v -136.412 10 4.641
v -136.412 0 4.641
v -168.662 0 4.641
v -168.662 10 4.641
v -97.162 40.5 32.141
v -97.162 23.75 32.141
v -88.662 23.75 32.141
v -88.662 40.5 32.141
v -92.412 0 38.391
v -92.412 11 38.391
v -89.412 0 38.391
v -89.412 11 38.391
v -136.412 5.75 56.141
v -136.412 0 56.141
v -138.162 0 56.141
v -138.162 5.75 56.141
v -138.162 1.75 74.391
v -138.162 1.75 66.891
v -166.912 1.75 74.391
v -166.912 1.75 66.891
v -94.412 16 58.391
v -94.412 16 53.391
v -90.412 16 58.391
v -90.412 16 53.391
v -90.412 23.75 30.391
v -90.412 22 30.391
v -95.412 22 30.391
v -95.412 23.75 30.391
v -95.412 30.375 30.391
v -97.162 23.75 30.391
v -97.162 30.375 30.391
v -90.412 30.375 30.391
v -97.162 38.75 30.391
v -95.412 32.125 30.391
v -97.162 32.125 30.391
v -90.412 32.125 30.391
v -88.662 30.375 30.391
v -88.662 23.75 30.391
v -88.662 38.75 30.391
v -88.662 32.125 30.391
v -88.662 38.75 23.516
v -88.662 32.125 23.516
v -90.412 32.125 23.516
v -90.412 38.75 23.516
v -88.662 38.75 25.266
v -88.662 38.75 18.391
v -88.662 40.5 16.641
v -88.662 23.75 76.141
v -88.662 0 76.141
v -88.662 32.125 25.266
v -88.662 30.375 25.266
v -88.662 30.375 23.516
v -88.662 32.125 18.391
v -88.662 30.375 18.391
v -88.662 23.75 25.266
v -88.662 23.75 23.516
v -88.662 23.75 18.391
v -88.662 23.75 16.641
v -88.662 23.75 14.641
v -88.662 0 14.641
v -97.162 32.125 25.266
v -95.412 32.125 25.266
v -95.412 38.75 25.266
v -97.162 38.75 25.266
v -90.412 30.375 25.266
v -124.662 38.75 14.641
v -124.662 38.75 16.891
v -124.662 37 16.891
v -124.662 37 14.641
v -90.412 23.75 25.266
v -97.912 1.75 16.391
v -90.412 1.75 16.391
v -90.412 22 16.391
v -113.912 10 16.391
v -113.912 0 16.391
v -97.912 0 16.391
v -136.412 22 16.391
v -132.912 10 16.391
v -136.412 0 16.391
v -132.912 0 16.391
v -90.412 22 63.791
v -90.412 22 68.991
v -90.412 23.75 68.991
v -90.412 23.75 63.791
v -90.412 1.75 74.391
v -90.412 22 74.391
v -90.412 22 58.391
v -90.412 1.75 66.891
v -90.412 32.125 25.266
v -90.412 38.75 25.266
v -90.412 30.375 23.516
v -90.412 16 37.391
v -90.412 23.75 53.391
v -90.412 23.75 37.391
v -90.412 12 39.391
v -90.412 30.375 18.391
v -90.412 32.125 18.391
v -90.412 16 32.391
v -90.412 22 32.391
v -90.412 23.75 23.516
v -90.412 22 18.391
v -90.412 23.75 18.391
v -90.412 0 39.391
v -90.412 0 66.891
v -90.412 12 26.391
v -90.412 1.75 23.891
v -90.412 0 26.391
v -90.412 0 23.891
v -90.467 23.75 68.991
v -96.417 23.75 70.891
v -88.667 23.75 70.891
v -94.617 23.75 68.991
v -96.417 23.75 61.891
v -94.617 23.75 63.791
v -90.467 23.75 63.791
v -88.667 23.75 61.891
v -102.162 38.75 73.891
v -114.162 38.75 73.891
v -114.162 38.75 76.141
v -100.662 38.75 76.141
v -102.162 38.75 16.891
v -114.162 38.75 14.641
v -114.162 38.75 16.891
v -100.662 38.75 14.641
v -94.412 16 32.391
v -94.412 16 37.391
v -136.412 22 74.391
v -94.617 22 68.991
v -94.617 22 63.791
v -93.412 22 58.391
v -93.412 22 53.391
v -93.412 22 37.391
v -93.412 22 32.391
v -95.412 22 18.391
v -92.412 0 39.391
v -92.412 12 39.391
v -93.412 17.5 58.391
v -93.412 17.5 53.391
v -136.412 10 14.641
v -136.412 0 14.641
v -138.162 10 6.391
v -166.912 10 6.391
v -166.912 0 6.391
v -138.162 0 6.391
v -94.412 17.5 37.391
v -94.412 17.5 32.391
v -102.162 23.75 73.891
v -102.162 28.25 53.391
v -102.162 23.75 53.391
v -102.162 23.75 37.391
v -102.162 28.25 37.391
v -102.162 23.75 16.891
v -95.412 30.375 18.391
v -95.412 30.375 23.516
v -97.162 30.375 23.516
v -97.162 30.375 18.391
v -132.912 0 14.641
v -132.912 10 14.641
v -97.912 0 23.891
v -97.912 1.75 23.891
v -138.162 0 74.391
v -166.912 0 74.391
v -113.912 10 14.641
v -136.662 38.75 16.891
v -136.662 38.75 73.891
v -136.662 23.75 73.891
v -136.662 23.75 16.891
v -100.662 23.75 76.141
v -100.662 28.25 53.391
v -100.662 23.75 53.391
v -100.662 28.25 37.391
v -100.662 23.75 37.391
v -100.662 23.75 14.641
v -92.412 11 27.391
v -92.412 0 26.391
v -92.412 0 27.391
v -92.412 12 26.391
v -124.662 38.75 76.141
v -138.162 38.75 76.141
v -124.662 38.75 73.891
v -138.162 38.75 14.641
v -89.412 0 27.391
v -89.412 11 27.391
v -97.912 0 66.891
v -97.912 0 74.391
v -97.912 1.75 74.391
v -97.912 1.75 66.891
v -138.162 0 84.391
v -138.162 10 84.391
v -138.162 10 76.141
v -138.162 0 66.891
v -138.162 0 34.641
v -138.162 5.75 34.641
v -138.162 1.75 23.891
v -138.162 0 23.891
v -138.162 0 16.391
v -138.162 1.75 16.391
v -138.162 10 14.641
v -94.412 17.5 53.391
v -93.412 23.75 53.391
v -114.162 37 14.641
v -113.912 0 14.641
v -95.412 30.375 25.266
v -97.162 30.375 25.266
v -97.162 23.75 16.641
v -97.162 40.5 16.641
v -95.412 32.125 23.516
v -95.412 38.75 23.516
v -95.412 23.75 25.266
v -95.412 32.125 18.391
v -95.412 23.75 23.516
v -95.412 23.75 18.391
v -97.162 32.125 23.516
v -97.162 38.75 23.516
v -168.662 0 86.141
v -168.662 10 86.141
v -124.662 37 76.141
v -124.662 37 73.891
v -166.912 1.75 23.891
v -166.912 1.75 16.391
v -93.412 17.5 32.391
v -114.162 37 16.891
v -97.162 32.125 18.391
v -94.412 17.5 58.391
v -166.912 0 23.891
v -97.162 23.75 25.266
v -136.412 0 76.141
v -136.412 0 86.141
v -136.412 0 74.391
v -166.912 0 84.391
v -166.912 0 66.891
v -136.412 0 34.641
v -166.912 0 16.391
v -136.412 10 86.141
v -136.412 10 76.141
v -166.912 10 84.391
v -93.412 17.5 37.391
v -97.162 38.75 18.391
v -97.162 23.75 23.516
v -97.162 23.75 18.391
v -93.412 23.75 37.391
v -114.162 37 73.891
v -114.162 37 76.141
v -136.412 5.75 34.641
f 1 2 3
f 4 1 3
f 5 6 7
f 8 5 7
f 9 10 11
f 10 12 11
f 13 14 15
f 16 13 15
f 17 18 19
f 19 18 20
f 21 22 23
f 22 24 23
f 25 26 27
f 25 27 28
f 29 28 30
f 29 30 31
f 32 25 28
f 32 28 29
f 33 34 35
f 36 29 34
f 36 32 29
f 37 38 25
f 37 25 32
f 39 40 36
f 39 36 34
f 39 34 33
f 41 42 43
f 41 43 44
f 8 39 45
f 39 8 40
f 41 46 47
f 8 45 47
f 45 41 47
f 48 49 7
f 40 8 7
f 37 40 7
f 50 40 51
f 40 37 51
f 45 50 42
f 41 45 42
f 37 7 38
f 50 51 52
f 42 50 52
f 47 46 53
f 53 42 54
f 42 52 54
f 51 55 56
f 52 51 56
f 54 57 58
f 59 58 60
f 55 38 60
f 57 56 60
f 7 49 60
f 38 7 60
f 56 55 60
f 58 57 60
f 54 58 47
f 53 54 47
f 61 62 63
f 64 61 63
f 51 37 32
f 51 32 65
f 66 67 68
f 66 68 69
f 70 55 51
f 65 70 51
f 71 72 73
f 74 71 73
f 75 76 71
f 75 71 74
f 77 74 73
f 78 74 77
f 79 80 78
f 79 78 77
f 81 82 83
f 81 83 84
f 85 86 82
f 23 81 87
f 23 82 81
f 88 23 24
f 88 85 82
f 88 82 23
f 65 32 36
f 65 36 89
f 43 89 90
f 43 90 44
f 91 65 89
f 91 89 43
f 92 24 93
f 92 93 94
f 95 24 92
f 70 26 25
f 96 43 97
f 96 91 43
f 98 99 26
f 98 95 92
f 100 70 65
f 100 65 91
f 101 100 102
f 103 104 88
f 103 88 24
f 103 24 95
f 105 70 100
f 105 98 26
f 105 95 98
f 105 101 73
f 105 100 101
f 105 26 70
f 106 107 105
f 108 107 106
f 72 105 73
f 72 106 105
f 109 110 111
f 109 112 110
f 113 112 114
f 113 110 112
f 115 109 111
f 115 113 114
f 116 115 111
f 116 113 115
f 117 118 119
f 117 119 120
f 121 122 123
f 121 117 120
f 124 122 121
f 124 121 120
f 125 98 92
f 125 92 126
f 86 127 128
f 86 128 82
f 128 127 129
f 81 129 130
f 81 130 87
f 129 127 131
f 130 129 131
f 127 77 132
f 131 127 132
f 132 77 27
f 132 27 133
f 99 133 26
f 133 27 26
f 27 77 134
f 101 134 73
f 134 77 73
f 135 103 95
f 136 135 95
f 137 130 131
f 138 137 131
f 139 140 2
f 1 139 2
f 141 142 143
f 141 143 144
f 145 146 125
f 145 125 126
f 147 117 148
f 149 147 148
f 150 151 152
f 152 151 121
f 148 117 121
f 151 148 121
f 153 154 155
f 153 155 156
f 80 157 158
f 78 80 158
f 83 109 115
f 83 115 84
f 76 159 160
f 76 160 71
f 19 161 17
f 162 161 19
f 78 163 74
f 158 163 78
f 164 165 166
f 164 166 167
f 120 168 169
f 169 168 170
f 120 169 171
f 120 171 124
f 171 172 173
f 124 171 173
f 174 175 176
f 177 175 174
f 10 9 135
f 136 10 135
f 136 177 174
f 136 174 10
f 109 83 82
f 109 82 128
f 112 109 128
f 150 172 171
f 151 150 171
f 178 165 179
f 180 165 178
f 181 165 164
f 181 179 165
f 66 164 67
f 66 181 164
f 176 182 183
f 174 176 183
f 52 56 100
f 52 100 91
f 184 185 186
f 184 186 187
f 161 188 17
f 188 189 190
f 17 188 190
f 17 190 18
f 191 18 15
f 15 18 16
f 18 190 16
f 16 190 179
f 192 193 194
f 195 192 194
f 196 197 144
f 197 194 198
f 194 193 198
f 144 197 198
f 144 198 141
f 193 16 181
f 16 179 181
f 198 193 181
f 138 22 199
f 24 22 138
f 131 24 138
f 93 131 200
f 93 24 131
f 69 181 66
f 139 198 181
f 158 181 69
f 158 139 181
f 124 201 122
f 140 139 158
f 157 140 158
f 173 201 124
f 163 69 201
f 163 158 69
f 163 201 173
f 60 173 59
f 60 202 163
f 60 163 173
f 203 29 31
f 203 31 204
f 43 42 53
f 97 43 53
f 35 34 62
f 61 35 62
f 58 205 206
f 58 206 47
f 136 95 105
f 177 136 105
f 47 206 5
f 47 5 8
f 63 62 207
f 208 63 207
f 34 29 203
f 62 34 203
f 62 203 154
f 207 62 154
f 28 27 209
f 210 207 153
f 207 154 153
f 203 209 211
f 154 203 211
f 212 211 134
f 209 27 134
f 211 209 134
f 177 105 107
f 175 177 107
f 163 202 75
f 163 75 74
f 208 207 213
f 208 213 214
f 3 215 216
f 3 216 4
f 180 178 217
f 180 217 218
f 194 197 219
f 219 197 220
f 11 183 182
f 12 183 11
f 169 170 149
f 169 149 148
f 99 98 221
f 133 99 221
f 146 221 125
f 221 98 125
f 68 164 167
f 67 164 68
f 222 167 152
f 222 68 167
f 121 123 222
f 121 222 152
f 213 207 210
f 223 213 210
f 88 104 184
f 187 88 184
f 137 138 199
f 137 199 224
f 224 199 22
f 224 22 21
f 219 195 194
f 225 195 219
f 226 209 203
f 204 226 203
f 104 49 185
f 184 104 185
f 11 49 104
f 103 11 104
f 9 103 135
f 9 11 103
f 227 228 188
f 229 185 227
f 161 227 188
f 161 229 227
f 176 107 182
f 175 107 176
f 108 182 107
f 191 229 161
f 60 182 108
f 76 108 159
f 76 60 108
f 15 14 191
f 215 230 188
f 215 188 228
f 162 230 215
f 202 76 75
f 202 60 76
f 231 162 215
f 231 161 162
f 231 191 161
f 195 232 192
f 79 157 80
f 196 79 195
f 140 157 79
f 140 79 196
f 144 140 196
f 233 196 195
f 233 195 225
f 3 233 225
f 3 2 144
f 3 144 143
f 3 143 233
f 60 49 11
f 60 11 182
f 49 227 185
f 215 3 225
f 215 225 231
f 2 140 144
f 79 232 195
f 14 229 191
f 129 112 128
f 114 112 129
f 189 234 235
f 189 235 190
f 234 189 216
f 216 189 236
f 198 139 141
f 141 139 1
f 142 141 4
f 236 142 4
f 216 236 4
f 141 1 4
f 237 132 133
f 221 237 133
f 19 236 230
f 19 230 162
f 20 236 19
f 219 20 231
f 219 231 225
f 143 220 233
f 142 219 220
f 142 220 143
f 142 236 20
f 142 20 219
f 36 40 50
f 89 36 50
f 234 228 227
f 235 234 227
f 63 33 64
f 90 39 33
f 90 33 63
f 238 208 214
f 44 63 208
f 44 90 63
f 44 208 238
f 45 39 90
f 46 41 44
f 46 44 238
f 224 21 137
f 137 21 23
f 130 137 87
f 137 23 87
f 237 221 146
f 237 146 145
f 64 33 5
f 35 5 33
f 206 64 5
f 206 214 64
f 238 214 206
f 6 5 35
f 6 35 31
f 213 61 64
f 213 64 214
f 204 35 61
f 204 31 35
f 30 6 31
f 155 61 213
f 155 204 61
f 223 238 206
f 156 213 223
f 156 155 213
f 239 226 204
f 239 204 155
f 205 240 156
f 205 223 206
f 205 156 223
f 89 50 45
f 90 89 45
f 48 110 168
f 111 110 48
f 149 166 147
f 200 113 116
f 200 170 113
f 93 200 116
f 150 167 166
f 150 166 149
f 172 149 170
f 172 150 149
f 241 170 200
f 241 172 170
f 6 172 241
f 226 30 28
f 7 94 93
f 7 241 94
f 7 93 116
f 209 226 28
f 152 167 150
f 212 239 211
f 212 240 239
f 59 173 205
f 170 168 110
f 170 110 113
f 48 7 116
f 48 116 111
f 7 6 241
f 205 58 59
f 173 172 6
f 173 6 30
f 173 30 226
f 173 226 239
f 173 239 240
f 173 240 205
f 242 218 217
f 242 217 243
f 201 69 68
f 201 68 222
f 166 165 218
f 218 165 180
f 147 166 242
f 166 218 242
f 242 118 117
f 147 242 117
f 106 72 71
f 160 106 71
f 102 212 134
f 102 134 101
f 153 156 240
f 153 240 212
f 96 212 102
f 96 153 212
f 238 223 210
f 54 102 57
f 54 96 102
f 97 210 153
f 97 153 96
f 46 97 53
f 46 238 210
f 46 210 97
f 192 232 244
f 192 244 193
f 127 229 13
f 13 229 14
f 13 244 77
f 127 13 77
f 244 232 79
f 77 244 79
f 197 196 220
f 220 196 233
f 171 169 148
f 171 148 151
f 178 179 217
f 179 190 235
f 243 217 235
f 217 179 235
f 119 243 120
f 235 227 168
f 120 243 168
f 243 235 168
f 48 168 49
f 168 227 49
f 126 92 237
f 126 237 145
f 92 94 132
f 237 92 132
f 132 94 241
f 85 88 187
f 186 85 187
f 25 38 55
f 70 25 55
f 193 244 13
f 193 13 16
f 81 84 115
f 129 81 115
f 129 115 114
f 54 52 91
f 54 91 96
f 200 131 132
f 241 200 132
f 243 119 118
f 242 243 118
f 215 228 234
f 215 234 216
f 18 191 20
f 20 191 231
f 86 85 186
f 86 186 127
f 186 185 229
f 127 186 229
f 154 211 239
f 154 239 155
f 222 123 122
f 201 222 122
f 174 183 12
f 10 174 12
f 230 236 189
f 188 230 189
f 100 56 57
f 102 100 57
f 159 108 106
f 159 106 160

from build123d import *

# Parameters (mm, degrees)
SKETCH1_W               = 49.5
SKETCH1_H               = 61.5
BOSS_EXTRUDE1_DEPTH     = 23.75
SKETCH2_W               = 46
SKETCH2_H               = 58
CUT_EXTRUDE1_DEPTH      = 22
SKETCH3_W               = 3
SKETCH3_H               = 16
CUT_EXTRUDE2_DEPTH      = 1.75
SKETCH7_W               = 3
SKETCH7_H               = 5
BOSS_EXTRUDE2_DEPTH     = 6
SKETCH11_W              = 37.5
SKETCH11_H              = 61.5
BOSS_EXTRUDE3_DEPTH     = 15
SKETCH12_W              = 34.5
SKETCH12_H              = 57
CUT_EXTRUDE3_DEPTH      = 15
SKETCH14_W              = 7.75
SKETCH14_H              = 9
BOSS_EXTRUDE4_DEPTH     = 0.0001
SKETCH15_W              = 4.15
SKETCH15_H              = 5.2
CUT_EXTRUDE4_DEPTH      = 4.75
SKETCH16_W              = 8.5
SKETCH16_H              = 15.5
BOSS_EXTRUDE5_DEPTH     = 16.75
SKETCH17_W              = 5.125
SKETCH17_H              = 6.625
CUT_EXTRUDE5_DEPTH      = 8.5
CUT_EXTRUDE6_DEPTH      = 15
CUT_EXTRUDE6_DEPTH_BACK = 1.75
SKETCH18_W              = 5
SKETCH18_H              = 12
SKETCH20_W              = 16
SKETCH20_H              = 4.5
CUT_EXTRUDE7_DEPTH      = 1.75
SKETCH21_W              = 32.25
SKETCH21_H              = 81.5
BOSS_EXTRUDE7_DEPTH     = 10
SKETCH23_W              = 28.75
SKETCH23_H              = 78
CUT_EXTRUDE8_DEPTH      = 10
SKETCH25_W              = 3
SKETCH25_H              = 5.4
BOSS_EXTRUDE8_DEPTH     = 1.75
SKETCH28_W              = 3
SKETCH28_H              = 2
BOSS_EXTRUDE9_DEPTH     = 1.75
SKETCH30_W              = 5
SKETCH30_H              = 1.5
BOSS_EXTRUDE11_DEPTH    = 1
SKETCH32_W              = 10.5
SKETCH32_H              = 2.25
CUT_EXTRUDE9_DEPTH      = 1.75
SKETCH33_W              = 11
SKETCH33_H              = 11
CUT_EXTRUDE10_DEPTH     = 1
SKETCH34_W              = 11
SKETCH34_H              = 1
BOSS_EXTRUDE12_DEPTH    = 2
SKETCH35_W              = 19
SKETCH35_H              = 10
CUT_EXTRUDE11_DEPTH     = 1.75
SKETCH36_W              = 1.75
SKETCH36_H              = 21.5
CUT_EXTRUDE12_DEPTH     = 5.75
SKETCH37_W              = 7.5
SKETCH37_H              = 7.5
SKETCH37_W_2            = 28.75
BOSS_EXTRUDE13_DEPTH    = 1.75


with BuildPart() as part:
    # Sketch1 → Boss-Extrude1 (new body)
    with BuildSketch(Plane(origin=(0, 0, 0), x_dir=(1, 0, 0), z_dir=(0, 1, 0))):
        with Locations((-113.412024913, -45.391200727)):
            Rectangle(SKETCH1_W, SKETCH1_H)
    extrude(amount=BOSS_EXTRUDE1_DEPTH)

    # Sketch2 → Cut-Extrude1 (cut)
    with BuildSketch(Plane(origin=(0, 0, 0), x_dir=(-1, 0, 0), z_dir=(0, -1, 0))):
        with Locations((113.412024913, -45.391200727)):
            Rectangle(SKETCH2_W, SKETCH2_H)
    extrude(amount=-CUT_EXTRUDE1_DEPTH, mode=Mode.SUBTRACT)

    # Sketch3 → Cut-Extrude2 (cut)
    with BuildSketch(Plane(origin=(0, 22, 0), x_dir=(-1, 0, 0), z_dir=(0, -1, 0))):
        with Locations((91.912024913, -66.391200727)):
            Rectangle(SKETCH3_W, SKETCH3_H)
        with Locations((91.912024913, -24.391200727)):
            Rectangle(SKETCH3_W, SKETCH3_H)
        with Locations((91.912024913, -45.391200727)):
            Rectangle(SKETCH3_W, SKETCH3_H)
    extrude(amount=-CUT_EXTRUDE2_DEPTH, mode=Mode.SUBTRACT)

    # Sketch7 → Boss-Extrude2 (add)
    with BuildSketch(Plane(origin=(0, 22, 0), x_dir=(-1, 0, 0), z_dir=(0, -1, 0))):
        with Locations((91.912024913, -55.891200727)):
            Rectangle(SKETCH7_W, SKETCH7_H)
        with Locations((91.912024913, -34.891200727)):
            Rectangle(SKETCH7_W, SKETCH7_H)
    extrude(amount=BOSS_EXTRUDE2_DEPTH)

    # Sketch11 → Boss-Extrude3 (add)
    with BuildSketch(Plane(origin=(0, 23.75, 0), x_dir=(1, 0, 0), z_dir=(0, 1, 0))):
        with Locations((-119.412024913, -45.391200727)):
            Rectangle(SKETCH11_W, SKETCH11_H)
    extrude(amount=BOSS_EXTRUDE3_DEPTH)

    # Sketch12 → Cut-Extrude3 (cut)
    with BuildSketch(Plane(origin=(0, 38.75, 0), x_dir=(1, 0, 0), z_dir=(0, 1, 0))):
        with Locations((-119.412024913, -45.391200727)):
            Rectangle(SKETCH12_W, SKETCH12_H)
    extrude(amount=-CUT_EXTRUDE3_DEPTH, mode=Mode.SUBTRACT)

    # Sketch14 → Boss-Extrude4 (add)
    with BuildSketch(Plane(origin=(0, 23.75, 0), x_dir=(1, 0, 0), z_dir=(0, 1, 0))):
        with Locations((-92.542024913, -66.391200727)):
            Rectangle(SKETCH14_W, SKETCH14_H)
    extrude(amount=BOSS_EXTRUDE4_DEPTH)

    # Sketch15 → Cut-Extrude4 (cut)
    with BuildSketch(Plane(origin=(0, 23.7501, 0), x_dir=(1, 0, 0), z_dir=(0, 1, 0))):
        with Locations((-92.542024913, -66.391200727)):
            Rectangle(SKETCH15_W, SKETCH15_H)
    extrude(amount=-CUT_EXTRUDE4_DEPTH, mode=Mode.SUBTRACT)

    # Sketch16 → Boss-Extrude5 (add)
    with BuildSketch(Plane(origin=(0, 23.75, 0), x_dir=(1, 0, 0), z_dir=(0, 1, 0))):
        with Locations((-92.912024913, -24.391200727)):
            Rectangle(SKETCH16_W, SKETCH16_H)
    extrude(amount=BOSS_EXTRUDE5_DEPTH)

    # Sketch17 → Cut-Extrude5 (cut)
    with BuildSketch(Plane(origin=(-88.662024913, 0, 0), x_dir=(0, 0, -1), z_dir=(1, 0, 0))):
        with Locations((-27.828700727, 35.4375)):
            Rectangle(SKETCH17_W, SKETCH17_H)
        with Locations((-27.828700727, 27.0625)):
            Rectangle(SKETCH17_W, SKETCH17_H)
        with Locations((-20.953700727, 35.4375)):
            Rectangle(SKETCH17_W, SKETCH17_H)
        with Locations((-20.953700727, 27.0625)):
            Rectangle(SKETCH17_W, SKETCH17_H)
    extrude(amount=-CUT_EXTRUDE5_DEPTH, mode=Mode.SUBTRACT)

    # Sketch18 → Cut-Extrude6 (cut, two sides: drawn at the far end of the back side and taken through both)
    with BuildSketch(Plane(origin=(0, 23.75, 0), x_dir=(1, 0, 0), z_dir=(0, 1, 0)).offset(-CUT_EXTRUDE6_DEPTH_BACK)):
        with Locations((-92.912024913, -24.391200727)):
            Rectangle(SKETCH18_W, SKETCH18_H)
    extrude(amount=CUT_EXTRUDE6_DEPTH + CUT_EXTRUDE6_DEPTH_BACK, mode=Mode.SUBTRACT)

    # Sketch20 → Cut-Extrude7 (cut)
    with BuildSketch(Plane(origin=(-100.662024913, 0, 0), x_dir=(0, 0, -1), z_dir=(1, 0, 0))):
        with Locations((-45.391200727, 26)):
            Rectangle(SKETCH20_W, SKETCH20_H)
    extrude(amount=-CUT_EXTRUDE7_DEPTH, mode=Mode.SUBTRACT)

    # Sketch21 → Boss-Extrude7 (add)
    with BuildSketch(Plane(origin=(0, 0, 0), x_dir=(-1, 0, 0), z_dir=(0, -1, 0))):
        with Locations((152.537024913, -45.391200727)):
            Rectangle(SKETCH21_W, SKETCH21_H)
    extrude(amount=-BOSS_EXTRUDE7_DEPTH)

    # Sketch23 → Cut-Extrude8 (cut)
    with BuildSketch(Plane(origin=(0, 10, 0), x_dir=(1, 0, 0), z_dir=(0, 1, 0))):
        with Locations((-152.537024913, -45.391200727)):
            Rectangle(SKETCH23_W, SKETCH23_H)
    extrude(amount=-CUT_EXTRUDE8_DEPTH, mode=Mode.SUBTRACT)

    # Sketch25 → Boss-Extrude8 (add)
    with BuildSketch(Plane(origin=(0, 22, 0), x_dir=(-1, 0, 0), z_dir=(0, -1, 0))):
        with Locations((91.912024913, -61.091200727)):
            Rectangle(SKETCH25_W, SKETCH25_H)
        with Locations((91.912024913, -71.691200727)):
            Rectangle(SKETCH25_W, SKETCH25_H)
    extrude(amount=-BOSS_EXTRUDE8_DEPTH)

    # Sketch28 → Boss-Extrude9 (add)
    with BuildSketch(Plane(origin=(0, 23.75, 0), x_dir=(1, 0, 0), z_dir=(0, 1, 0))):
        with Locations((-91.912024913, -17.391200727)):
            Rectangle(SKETCH28_W, SKETCH28_H)
        with Locations((-91.912024913, -31.391200727)):
            Rectangle(SKETCH28_W, SKETCH28_H)
    extrude(amount=-BOSS_EXTRUDE9_DEPTH)

    # Sketch30 → Boss-Extrude11 (add)
    with BuildSketch(Plane.ZY.offset(93.412024913)):
        with Locations((55.891200727, 16.75)):
            Rectangle(SKETCH30_W, SKETCH30_H)
        with Locations((34.891200727, 16.75)):
            Rectangle(SKETCH30_W, SKETCH30_H)
    extrude(amount=BOSS_EXTRUDE11_DEPTH)

    # Sketch32 → Cut-Extrude9 (cut)
    with BuildSketch(Plane(origin=(0, 38.75, 0), x_dir=(1, 0, 0), z_dir=(0, 1, 0))):
        with Locations((-119.412024913, -75.016200727)):
            Rectangle(SKETCH32_W, SKETCH32_H)
        with Locations((-119.412024913, -15.766200727)):
            Rectangle(SKETCH32_W, SKETCH32_H)
    extrude(amount=-CUT_EXTRUDE9_DEPTH, mode=Mode.SUBTRACT)

    # Sketch33 → Cut-Extrude10 (cut)
    with BuildSketch(Plane.ZY.offset(90.412024913)):
        with Locations((32.891200727, 5.5)):
            Rectangle(SKETCH33_W, SKETCH33_H)
    extrude(amount=-CUT_EXTRUDE10_DEPTH, mode=Mode.SUBTRACT)

    # Sketch34 → Boss-Extrude12 (add)
    with BuildSketch(Plane.ZY.offset(90.412024913)):
        with Locations((32.891200727, 11.5)):
            Rectangle(SKETCH34_W, SKETCH34_H)
        Polygon((38.391200727, 12), (38.391200727, 11), (38.391200727, 0), (39.391200727, 0), (39.391200727, 12), align=None)
        Polygon((26.391200727, 0), (27.391200727, 0), (27.391200727, 11), (27.391200727, 12), (26.391200727, 12), align=None)
    extrude(amount=BOSS_EXTRUDE12_DEPTH)

    # Sketch35 → Cut-Extrude11 (cut)
    with BuildSketch(Plane(origin=(0, 0, 14.641200727), x_dir=(-1, 0, 0), z_dir=(0, 0, -1))):
        with Locations((123.412024913, 5)):
            Rectangle(SKETCH35_W, SKETCH35_H)
    extrude(amount=-CUT_EXTRUDE11_DEPTH, mode=Mode.SUBTRACT)

    # Sketch36 → Cut-Extrude12 (cut)
    with BuildSketch(Plane(origin=(0, 0, 0), x_dir=(-1, 0, 0), z_dir=(0, -1, 0))):
        with Locations((137.287024913, -45.391200727)):
            Rectangle(SKETCH36_W, SKETCH36_H)
    extrude(amount=-CUT_EXTRUDE12_DEPTH, mode=Mode.SUBTRACT)

    # Sketch37 → Boss-Extrude13 (add)
    with BuildSketch(Plane(origin=(0, 0, 0), x_dir=(-1, 0, 0), z_dir=(0, -1, 0))):
        with Locations((94.162024913, -70.641200727)):
            Rectangle(SKETCH37_W, SKETCH37_H)
        with Locations((94.162024913, -20.141200727)):
            Rectangle(SKETCH37_W, SKETCH37_H)
        with Locations((152.537024913, -70.641200727)):
            Rectangle(SKETCH37_W_2, SKETCH37_H)
        with Locations((152.537024913, -20.141200727)):
            Rectangle(SKETCH37_W_2, SKETCH37_H)
    extrude(amount=-BOSS_EXTRUDE13_DEPTH)


solid = part.part
